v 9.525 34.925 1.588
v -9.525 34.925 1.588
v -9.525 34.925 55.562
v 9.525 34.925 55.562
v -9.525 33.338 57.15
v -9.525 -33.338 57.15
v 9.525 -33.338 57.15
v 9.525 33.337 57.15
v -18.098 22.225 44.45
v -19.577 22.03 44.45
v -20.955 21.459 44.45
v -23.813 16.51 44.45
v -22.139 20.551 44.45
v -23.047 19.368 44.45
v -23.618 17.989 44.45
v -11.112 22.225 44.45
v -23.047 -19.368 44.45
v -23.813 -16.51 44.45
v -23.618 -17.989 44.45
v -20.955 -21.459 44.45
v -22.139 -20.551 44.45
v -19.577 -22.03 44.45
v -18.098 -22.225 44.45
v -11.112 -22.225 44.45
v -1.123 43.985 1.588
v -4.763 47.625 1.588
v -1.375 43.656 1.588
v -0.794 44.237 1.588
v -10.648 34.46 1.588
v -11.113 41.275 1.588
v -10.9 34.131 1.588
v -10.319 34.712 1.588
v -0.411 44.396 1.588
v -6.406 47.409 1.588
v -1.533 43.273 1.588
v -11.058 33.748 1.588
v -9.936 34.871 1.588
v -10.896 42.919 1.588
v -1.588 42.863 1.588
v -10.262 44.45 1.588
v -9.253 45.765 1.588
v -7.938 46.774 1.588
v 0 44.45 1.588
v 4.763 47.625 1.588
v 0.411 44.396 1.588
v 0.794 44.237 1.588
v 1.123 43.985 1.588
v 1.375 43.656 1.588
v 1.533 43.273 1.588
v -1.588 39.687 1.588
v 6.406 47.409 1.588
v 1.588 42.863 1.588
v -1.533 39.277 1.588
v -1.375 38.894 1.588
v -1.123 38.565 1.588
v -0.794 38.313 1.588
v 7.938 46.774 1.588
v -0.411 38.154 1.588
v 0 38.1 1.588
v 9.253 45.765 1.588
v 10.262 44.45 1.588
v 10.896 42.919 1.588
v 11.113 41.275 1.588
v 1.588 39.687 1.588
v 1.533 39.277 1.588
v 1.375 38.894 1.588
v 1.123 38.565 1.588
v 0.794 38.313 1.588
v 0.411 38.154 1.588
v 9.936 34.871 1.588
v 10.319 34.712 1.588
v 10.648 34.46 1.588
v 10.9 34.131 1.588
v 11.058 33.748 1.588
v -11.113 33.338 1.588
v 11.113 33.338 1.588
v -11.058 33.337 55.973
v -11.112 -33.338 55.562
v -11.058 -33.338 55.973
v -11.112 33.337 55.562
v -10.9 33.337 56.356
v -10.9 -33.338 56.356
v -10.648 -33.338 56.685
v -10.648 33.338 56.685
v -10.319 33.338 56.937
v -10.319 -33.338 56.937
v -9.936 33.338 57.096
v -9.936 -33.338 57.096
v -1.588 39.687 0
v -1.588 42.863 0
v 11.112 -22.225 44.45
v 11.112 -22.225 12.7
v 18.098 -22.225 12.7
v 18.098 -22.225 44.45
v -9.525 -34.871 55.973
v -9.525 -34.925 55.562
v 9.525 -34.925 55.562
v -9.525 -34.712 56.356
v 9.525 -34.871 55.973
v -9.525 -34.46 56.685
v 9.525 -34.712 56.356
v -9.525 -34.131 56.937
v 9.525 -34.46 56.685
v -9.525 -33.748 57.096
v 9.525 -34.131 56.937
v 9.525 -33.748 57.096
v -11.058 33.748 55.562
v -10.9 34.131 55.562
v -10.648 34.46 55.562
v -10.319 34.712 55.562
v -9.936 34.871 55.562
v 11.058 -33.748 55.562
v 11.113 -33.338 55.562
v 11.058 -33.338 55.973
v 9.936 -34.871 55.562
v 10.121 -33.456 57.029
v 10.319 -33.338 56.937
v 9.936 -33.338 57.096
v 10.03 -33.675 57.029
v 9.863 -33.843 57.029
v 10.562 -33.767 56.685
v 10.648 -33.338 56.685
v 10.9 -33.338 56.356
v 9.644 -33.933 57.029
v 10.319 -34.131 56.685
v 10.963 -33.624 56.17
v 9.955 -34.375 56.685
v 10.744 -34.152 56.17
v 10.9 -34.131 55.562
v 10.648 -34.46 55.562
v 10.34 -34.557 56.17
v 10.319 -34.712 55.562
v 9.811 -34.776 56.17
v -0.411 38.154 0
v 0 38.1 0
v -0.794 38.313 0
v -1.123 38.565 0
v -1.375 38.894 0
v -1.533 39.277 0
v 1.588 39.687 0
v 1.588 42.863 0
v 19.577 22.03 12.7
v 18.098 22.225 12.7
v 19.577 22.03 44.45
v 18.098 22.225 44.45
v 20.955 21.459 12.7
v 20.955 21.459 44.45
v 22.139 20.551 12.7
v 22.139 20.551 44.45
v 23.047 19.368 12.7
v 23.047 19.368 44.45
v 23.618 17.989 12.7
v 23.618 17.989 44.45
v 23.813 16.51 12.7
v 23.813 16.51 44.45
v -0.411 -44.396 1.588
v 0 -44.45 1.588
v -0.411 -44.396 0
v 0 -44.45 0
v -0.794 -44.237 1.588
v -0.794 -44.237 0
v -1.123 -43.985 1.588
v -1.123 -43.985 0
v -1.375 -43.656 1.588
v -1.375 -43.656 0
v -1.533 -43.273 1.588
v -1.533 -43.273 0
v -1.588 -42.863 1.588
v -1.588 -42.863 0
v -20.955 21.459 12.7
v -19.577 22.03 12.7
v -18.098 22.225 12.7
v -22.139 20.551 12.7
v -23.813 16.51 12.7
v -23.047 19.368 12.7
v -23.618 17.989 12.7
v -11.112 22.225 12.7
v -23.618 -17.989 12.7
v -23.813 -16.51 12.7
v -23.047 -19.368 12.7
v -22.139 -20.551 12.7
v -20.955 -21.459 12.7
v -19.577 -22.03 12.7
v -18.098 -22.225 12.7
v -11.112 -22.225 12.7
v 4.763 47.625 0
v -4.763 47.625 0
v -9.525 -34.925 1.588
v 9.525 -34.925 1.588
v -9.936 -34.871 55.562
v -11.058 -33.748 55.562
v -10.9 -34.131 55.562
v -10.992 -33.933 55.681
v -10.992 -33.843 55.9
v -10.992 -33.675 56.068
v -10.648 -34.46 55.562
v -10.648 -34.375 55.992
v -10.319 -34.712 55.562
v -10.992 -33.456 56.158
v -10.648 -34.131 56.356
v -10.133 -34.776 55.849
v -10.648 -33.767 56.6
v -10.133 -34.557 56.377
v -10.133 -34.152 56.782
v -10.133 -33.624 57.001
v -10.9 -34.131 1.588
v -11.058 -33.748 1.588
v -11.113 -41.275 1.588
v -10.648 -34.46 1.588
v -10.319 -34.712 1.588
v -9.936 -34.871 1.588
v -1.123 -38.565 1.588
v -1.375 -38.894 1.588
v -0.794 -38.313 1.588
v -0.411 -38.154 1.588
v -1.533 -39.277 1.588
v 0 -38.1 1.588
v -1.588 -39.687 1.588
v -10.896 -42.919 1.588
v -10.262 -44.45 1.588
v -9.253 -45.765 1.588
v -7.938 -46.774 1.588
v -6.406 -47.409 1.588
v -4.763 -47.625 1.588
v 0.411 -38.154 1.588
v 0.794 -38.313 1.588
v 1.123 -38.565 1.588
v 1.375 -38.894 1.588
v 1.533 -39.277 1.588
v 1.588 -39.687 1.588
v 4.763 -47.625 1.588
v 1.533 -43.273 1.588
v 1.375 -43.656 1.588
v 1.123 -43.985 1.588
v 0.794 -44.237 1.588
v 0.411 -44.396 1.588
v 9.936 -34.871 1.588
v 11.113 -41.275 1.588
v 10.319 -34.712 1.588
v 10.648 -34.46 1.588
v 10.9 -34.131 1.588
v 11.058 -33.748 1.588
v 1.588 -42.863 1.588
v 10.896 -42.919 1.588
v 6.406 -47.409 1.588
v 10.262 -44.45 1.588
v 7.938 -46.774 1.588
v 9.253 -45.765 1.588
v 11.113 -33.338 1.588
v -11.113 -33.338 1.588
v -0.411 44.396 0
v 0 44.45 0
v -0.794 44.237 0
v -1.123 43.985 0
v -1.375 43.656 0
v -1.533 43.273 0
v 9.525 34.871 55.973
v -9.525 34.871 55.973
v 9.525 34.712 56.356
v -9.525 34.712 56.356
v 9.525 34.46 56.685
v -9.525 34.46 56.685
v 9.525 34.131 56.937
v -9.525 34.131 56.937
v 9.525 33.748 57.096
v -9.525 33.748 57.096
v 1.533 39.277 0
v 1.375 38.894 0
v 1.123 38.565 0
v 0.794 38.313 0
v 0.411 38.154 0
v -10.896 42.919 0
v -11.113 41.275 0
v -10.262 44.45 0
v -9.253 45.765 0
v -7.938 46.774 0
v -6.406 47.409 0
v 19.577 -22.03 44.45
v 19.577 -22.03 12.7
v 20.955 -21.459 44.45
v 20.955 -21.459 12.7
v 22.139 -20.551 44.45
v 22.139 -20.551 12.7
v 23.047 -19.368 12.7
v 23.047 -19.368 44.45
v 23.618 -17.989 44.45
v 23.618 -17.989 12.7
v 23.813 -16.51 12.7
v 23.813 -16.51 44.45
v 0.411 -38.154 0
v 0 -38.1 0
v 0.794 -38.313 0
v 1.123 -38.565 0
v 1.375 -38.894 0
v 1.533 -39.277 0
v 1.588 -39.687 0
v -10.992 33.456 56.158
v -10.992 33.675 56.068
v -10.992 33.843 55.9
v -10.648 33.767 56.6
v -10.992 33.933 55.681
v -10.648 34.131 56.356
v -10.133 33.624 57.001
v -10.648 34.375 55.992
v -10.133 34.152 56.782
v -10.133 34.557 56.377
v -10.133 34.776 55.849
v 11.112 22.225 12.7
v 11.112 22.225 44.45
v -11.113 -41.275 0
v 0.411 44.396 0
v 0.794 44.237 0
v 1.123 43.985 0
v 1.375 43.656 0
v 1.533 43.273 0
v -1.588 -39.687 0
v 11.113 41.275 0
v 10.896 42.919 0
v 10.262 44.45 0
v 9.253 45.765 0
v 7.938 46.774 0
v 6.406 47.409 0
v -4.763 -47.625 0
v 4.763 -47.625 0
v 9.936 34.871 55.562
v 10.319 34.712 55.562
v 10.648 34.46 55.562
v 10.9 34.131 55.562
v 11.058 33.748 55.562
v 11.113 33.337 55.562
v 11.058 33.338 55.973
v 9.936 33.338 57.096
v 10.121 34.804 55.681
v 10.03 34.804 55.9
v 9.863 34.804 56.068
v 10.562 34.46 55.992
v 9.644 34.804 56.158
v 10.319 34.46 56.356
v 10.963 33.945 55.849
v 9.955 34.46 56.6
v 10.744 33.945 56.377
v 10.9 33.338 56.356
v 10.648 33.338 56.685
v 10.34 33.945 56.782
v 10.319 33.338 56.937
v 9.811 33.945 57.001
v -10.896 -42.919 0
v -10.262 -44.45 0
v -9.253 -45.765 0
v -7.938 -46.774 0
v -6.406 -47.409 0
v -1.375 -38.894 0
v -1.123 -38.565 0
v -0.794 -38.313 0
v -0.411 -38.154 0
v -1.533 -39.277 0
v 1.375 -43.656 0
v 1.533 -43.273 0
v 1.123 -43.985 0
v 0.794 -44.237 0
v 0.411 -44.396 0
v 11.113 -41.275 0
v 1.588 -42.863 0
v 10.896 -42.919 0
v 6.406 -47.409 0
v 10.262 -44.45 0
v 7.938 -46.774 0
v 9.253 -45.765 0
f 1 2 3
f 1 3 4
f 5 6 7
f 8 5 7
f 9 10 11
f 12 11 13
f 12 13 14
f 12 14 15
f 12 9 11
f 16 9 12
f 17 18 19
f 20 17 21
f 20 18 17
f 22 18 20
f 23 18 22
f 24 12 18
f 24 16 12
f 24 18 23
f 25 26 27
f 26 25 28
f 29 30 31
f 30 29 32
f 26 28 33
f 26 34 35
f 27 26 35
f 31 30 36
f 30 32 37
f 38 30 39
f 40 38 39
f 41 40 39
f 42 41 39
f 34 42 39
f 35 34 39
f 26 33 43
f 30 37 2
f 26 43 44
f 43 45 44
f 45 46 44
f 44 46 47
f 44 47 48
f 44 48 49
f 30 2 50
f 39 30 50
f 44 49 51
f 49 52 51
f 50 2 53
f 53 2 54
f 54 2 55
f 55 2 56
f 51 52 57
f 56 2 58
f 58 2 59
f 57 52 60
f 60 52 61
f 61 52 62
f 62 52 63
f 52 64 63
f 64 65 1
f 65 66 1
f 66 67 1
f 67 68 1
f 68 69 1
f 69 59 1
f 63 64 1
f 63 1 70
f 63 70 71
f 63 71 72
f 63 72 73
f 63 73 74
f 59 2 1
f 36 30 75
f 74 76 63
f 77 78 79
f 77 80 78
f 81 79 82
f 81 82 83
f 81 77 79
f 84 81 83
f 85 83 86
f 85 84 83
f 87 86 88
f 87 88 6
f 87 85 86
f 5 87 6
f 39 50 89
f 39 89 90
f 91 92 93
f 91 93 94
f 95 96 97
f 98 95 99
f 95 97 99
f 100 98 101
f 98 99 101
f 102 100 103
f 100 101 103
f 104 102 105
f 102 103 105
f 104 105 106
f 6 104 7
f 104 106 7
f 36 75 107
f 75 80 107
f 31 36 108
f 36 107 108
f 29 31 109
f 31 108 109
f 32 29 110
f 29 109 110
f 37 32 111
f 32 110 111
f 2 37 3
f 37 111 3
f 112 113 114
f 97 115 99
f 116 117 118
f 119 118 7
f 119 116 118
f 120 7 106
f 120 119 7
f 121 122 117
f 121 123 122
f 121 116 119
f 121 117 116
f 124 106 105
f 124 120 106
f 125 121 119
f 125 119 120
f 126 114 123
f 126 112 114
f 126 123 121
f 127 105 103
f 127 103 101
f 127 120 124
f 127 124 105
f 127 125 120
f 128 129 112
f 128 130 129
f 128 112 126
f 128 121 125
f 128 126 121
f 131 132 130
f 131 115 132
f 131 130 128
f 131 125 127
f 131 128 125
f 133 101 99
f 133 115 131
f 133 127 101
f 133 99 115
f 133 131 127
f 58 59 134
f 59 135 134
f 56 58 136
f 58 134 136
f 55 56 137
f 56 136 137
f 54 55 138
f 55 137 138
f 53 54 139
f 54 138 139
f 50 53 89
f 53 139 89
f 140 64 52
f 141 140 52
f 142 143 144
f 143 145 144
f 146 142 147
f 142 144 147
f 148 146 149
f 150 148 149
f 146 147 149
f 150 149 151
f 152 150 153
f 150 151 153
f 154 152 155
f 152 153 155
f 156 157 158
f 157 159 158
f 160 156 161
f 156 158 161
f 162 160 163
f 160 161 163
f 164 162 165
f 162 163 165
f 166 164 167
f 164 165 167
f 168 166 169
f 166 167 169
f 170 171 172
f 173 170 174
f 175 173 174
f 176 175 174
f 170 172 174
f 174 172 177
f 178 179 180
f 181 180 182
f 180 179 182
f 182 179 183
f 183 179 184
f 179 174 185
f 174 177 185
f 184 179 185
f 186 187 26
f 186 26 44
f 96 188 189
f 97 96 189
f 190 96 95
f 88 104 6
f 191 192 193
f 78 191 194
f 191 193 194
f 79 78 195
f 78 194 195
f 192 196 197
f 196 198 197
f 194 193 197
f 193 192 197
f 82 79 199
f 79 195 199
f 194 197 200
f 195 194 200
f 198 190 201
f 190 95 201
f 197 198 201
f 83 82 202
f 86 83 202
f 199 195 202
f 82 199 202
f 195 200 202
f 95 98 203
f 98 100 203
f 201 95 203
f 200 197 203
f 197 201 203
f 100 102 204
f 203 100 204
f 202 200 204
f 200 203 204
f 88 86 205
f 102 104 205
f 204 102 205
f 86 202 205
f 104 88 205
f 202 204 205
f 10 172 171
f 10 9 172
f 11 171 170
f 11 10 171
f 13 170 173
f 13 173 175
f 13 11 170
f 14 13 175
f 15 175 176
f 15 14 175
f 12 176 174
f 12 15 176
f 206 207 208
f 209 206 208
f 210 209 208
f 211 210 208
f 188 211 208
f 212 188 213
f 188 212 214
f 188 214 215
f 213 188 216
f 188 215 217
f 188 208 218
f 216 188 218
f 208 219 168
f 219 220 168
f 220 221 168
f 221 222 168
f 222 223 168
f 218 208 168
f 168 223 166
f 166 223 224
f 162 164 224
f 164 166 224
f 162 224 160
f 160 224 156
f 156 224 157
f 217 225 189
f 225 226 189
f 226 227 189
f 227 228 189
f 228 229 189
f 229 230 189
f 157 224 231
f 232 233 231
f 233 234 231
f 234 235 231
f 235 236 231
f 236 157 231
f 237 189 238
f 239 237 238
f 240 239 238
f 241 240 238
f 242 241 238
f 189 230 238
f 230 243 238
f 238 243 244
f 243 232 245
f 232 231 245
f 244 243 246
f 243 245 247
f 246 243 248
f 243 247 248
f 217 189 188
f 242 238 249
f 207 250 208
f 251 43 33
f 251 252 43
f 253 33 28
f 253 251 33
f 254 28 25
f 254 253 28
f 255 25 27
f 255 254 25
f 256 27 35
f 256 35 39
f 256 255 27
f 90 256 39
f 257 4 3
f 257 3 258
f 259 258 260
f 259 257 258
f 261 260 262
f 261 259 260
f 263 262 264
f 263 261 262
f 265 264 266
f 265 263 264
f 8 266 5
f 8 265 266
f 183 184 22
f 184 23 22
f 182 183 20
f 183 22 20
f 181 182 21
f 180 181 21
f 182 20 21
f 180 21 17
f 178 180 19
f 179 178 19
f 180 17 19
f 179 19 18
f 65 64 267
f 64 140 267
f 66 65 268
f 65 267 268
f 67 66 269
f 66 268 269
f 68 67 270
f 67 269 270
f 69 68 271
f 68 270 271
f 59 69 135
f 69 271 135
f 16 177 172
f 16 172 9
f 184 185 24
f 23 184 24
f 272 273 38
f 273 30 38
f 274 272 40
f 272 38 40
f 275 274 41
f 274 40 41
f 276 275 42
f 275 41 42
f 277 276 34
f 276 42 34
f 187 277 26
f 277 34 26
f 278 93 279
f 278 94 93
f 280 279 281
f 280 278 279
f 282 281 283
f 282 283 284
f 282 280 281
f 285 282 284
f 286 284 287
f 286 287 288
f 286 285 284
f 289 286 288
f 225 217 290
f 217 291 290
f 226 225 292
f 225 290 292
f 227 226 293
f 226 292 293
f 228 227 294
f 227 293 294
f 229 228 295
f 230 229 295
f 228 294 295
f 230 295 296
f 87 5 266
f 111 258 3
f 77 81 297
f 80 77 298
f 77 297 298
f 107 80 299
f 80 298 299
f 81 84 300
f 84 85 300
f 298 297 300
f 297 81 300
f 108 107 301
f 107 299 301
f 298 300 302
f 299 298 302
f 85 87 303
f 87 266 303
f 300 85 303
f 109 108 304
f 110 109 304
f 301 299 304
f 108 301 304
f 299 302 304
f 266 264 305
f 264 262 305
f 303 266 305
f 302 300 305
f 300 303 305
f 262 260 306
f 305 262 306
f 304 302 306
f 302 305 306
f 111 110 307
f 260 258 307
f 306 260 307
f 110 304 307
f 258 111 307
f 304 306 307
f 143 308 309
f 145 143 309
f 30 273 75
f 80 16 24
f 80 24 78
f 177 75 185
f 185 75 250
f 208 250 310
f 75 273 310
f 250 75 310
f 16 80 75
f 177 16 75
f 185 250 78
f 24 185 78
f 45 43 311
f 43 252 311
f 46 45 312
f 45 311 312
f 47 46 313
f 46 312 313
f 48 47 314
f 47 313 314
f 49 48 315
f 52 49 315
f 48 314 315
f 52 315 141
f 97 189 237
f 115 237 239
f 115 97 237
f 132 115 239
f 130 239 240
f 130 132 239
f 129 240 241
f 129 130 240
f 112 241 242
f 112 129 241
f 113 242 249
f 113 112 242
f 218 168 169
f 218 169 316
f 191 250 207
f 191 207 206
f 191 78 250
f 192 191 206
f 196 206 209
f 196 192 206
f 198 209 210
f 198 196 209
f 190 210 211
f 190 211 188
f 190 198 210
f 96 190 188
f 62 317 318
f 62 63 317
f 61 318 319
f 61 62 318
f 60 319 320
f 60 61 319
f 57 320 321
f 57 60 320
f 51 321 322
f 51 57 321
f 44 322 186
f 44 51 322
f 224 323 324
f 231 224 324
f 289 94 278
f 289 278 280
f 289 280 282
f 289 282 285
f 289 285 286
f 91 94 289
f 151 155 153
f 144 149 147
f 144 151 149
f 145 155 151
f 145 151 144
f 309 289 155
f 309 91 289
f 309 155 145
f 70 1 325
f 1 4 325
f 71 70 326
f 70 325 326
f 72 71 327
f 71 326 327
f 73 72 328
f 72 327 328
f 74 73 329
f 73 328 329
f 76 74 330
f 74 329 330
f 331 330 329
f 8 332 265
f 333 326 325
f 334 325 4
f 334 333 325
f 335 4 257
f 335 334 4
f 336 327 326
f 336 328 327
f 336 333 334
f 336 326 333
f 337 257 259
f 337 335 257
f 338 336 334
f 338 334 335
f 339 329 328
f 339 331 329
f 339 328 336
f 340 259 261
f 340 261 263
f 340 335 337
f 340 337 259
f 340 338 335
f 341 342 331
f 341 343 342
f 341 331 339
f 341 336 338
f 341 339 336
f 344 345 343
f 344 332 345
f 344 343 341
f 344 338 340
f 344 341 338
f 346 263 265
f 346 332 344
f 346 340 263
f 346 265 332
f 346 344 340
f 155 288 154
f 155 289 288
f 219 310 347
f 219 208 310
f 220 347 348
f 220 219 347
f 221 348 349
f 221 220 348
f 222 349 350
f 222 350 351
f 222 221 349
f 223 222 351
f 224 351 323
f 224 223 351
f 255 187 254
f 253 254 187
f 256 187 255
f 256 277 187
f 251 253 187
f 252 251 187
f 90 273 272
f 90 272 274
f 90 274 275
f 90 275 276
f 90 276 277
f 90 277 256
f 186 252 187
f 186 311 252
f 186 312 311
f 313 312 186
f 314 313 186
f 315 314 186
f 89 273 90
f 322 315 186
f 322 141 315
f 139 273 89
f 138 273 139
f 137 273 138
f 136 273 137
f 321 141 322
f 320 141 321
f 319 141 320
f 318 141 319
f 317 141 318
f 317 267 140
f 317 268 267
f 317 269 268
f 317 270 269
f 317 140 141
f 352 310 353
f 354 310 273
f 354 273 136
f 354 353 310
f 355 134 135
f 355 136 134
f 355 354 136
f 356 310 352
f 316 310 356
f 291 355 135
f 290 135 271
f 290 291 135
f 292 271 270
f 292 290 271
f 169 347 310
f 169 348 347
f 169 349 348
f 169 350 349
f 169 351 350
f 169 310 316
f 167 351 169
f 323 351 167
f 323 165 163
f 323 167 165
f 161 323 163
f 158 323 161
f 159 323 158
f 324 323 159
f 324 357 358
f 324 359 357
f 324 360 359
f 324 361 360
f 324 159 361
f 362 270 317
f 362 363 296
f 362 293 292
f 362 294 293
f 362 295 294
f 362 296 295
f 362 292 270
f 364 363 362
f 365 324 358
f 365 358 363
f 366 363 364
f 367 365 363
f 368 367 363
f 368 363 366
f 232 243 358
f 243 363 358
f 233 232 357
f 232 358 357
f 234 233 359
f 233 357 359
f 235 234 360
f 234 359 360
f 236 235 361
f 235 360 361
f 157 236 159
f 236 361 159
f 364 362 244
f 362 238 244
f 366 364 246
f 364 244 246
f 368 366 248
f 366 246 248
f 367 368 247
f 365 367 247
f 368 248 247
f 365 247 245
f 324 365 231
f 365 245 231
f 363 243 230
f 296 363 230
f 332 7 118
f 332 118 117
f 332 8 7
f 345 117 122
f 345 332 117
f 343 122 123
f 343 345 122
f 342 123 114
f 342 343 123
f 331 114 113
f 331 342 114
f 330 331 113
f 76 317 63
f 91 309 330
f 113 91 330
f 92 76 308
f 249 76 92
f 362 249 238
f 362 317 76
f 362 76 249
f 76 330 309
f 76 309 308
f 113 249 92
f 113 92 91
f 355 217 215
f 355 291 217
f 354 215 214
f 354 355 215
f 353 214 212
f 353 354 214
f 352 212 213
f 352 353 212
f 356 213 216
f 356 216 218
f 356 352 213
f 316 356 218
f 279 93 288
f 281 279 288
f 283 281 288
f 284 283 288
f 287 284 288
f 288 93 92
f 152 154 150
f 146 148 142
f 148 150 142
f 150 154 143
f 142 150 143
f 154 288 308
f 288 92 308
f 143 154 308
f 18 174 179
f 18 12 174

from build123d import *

# Parameters (mm, degrees)
F0_W      = 22.225
F0_H      = 69.85
F1_DEPTH  = 57.15
F2_W      = 22.225
F2_H      = 12.7
F3_DEPTH  = 1.5875
F4_R      = 6.35
F5_W      = 3.175
F5_H      = 6.35
F6_DEPTH  = 25.4
F7_R      = 1.58749
F8_W      = 44.45
F8_H      = 31.75
F10_DEPTH = 12.7
F9_W      = 44.45
F9_H      = 31.75
F11_DEPTH = 12.7
F12_R     = 5.715
F13_R     = 1.5875


# Not quite as in the source:
# - a fillet or chamfer is up to 0.001 mm smaller than in the source, because OpenCascade refuses the exact size


with BuildPart() as f1:
    # F0 (on Top) → F1 (new body)
    with BuildSketch(Plane.XY):
        Rectangle(F0_W, F0_H)
    extrude(amount=F1_DEPTH)

    # F2 (on face) → F3 (join)
    with BuildSketch(Plane(origin=(0, 0, 0), x_dir=(1, 0, 0), z_dir=(0, 0, -1))):
        with Locations((0, 41.275)):
            Rectangle(F2_W, F2_H)
        with Locations((0, -41.275)):
            Rectangle(F2_W, F2_H)
    extrude(amount=-F3_DEPTH)

    # F4
    f4_edges = [f1.edges().sort_by_distance(p)[0] for p in [
        (-11.1125, -47.625, 0.79375),
        (11.1125, -47.625, 0.79375),
        (-11.1125, 47.625, 0.79375),
        (11.1125, 47.625, 0.79375),
    ]]
    fillet(f4_edges, radius=F4_R)

    # F5 (on face) → F6 (cut)
    with BuildSketch(Plane.XY.offset(1.5875)):
        with Locations((0, 41.275)):
            Rectangle(F5_W, F5_H)
        with Locations((0, -41.275)):
            Rectangle(F5_W, F5_H)
    extrude(amount=-F6_DEPTH, mode=Mode.SUBTRACT)

    # F7 (radius 1.5875 in the source; OpenCascade refuses exactly that, so slightly less here)
    f7_edges = [f1.edges().sort_by_distance(p)[0] for p in [
        (1.5875, 44.45, 0.79375),
        (-1.5875, 44.45, 0.79375),
        (-1.5875, 38.1, 0.79375),
        (1.5875, 38.1, 0.79375),
        (1.5875, -38.1, 0.79375),
        (-1.5875, -38.1, 0.79375),
        (-1.5875, -44.45, 0.79375),
        (1.5875, -44.45, 0.79375),
    ]]
    fillet(f7_edges, radius=F7_R)

    # F8 (on face) → F10 (join)
    with BuildSketch(Plane.YZ.offset(11.1125)):
        with Locations((0, 28.575)):
            Rectangle(F8_W, F8_H)
    extrude(amount=F10_DEPTH)

    # F9 (on face) → F11 (join)
    with BuildSketch(Plane(origin=(-11.1125, 0, 0), x_dir=(0, -1, 0), z_dir=(-1, 0, 0))):
        with Locations((0, 28.575)):
            Rectangle(F9_W, F9_H)
    extrude(amount=F11_DEPTH)

    # F12
    f12_edges = [f1.edges().sort_by_distance(p)[0] for p in [
        (23.8125, -22.225, 28.575),
        (23.8125, 22.225, 28.575),
        (-23.8125, -22.225, 28.575),
        (-23.8125, 22.225, 28.575),
    ]]
    fillet(f12_edges, radius=F12_R)

    # F13
    f13_edges = [f1.edges().sort_by_distance(p)[0] for p in [
        (11.1125, -34.925, 29.36875),
        (11.1125, 0, 57.15),
        (11.1125, 34.925, 29.36875),
        (0, -34.925, 57.15),
        (0, 34.925, 57.15),
        (-11.1125, -34.925, 29.36875),
        (-11.1125, 0, 57.15),
        (-11.1125, 34.925, 29.36875),
    ]]
    fillet(f13_edges, radius=F13_R)


solid = f1.part
